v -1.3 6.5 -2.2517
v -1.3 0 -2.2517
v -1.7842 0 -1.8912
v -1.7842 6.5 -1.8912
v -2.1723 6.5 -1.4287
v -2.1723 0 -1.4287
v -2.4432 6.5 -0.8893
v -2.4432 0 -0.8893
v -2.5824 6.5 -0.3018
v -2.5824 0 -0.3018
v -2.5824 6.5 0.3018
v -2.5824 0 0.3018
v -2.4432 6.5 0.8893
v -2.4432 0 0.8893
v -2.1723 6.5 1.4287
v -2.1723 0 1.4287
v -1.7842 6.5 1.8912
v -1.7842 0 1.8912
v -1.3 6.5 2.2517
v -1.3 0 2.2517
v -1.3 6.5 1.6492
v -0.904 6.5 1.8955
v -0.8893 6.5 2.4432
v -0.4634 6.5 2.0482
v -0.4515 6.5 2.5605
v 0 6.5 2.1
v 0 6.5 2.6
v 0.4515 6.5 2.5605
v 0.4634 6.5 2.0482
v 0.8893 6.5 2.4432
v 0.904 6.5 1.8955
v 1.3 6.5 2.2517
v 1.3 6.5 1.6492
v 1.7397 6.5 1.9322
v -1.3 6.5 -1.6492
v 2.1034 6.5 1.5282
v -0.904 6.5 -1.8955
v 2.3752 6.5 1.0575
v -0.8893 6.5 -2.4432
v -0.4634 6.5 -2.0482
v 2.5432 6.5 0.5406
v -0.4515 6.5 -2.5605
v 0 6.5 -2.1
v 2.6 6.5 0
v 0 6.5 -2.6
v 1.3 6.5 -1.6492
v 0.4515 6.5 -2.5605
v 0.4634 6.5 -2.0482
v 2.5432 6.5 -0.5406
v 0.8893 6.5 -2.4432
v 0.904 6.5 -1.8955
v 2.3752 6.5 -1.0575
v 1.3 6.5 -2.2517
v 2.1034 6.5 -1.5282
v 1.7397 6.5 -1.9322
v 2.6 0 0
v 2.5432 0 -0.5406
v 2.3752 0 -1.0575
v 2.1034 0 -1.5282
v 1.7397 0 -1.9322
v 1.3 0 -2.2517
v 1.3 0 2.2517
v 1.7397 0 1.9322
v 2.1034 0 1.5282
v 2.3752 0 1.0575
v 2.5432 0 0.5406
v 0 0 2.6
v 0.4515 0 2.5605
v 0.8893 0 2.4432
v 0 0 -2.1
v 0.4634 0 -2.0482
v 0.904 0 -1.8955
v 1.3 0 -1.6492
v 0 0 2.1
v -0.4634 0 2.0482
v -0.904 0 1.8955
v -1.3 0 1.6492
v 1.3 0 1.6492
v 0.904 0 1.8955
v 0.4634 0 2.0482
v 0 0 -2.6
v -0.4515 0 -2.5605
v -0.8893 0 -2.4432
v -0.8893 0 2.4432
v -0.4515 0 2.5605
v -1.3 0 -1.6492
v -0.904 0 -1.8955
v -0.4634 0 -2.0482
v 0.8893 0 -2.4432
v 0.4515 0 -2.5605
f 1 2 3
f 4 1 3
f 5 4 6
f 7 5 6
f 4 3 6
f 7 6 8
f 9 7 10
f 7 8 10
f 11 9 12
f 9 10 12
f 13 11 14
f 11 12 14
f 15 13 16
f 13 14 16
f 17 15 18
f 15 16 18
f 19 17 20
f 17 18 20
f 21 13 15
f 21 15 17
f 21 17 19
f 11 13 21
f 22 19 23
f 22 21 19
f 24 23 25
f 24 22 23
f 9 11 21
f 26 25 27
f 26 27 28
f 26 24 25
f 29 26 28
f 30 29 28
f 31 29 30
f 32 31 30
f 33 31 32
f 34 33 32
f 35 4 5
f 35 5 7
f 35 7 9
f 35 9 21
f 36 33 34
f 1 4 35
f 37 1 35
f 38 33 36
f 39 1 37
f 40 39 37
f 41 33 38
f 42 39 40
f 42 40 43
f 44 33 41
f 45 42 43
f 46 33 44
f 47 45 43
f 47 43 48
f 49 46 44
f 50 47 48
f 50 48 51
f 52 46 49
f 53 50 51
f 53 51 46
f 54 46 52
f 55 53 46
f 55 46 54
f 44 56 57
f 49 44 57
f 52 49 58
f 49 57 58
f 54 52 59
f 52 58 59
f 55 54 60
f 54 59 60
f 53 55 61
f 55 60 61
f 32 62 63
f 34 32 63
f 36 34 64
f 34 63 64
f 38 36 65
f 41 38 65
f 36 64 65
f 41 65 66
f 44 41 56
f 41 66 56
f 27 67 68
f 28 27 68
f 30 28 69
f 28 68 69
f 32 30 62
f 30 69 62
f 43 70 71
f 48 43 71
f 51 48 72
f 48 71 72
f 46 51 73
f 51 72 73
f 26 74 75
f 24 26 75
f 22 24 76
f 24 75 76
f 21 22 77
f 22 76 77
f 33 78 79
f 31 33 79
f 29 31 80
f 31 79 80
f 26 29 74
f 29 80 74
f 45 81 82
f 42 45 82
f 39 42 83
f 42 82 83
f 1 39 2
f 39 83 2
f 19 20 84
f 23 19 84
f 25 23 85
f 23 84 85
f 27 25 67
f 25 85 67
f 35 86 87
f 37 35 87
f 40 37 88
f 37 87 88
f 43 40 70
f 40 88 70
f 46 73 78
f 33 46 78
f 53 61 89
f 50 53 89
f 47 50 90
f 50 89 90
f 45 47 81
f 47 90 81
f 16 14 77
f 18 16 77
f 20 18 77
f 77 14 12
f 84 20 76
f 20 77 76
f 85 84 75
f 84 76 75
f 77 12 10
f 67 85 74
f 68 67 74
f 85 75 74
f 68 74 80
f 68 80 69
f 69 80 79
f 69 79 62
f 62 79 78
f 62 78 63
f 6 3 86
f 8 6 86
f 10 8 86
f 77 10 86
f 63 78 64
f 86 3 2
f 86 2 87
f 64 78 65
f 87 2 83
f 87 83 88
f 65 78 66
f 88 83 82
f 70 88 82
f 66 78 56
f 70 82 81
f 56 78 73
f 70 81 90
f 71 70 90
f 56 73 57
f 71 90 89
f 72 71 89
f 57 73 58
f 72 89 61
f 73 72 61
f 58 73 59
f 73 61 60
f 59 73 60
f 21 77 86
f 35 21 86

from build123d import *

# Parameters (mm, degrees)
RESSALTO_EXTRUS_O2_DEPTH = 6.5


with BuildPart() as part:
    # Esboço1 → Ressalto-extrusão2 (new body)
    with BuildSketch(Plane(origin=(0, 0, 0), x_dir=(1, 0, 0), z_dir=(0, 1, 0))):
        with BuildLine():
            Line((-1.3, -1.64924225), (-1.3, 1.64924225))
            ThreePointArc((-1.3, 1.64924225), (-2.1, 0), (-1.3, -1.64924225))
        make_face()
        with BuildLine():
            Line((-1.3, 1.64924225), (-1.3, 2.25166605))
            ThreePointArc((-1.3, 2.25166605), (-2.6, 0), (-1.3, -2.25166605))
            Line((-1.3, -2.25166605), (-1.3, -1.64924225))
            ThreePointArc((-1.3, -1.64924225), (-2.1, 0), (-1.3, 1.64924225))
        make_face()
        with BuildLine():
            Line((0, 2.1), (0, 2.6))
            ThreePointArc((0, 2.6), (-0.672929517, 2.511407148), (-1.3, 2.25166605))
            Line((-1.3, 2.25166605), (-1.3, 1.64924225))
            ThreePointArc((-1.3, 1.64924225), (-0.687964852, 1.984112991), (0, 2.1))
        make_face()
        with BuildLine():
            Line((0, -2.6), (0, -2.1))
            ThreePointArc((0, -2.1), (-0.687964852, -1.984112991), (-1.3, -1.64924225))
            Line((-1.3, -1.64924225), (-1.3, -2.25166605))
            ThreePointArc((-1.3, -2.25166605), (-0.672929517, -2.511407148), (0, -2.6))
        make_face()
        with BuildLine():
            ThreePointArc((1.3, 2.25166605), (0.672929517, 2.511407148), (0, 2.6))
            Line((0, 2.6), (0, 2.1))
            ThreePointArc((0, 2.1), (0.687964852, 1.984112991), (1.3, 1.64924225))
            Line((1.3, 1.64924225), (1.3, 2.25166605))
        make_face()
        with BuildLine():
            ThreePointArc((1.3, -1.64924225), (0.687964852, -1.984112991), (0, -2.1))
            Line((0, -2.1), (0, -2.6))
            ThreePointArc((0, -2.6), (0.672929517, -2.511407148), (1.3, -2.25166605))
            Line((1.3, -2.25166605), (1.3, -1.64924225))
        make_face()
        with BuildLine():
            ThreePointArc((2.6, 0), (2.25166605, 1.3), (1.3, 2.25166605))
            Line((1.3, 2.25166605), (1.3, 1.64924225))
            ThreePointArc((1.3, 1.64924225), (1.889444363, 0.916515139), (2.1, 0))
            ThreePointArc((2.1, 0), (1.889444363, -0.916515139), (1.3, -1.64924225))
            Line((1.3, -1.64924225), (1.3, -2.25166605))
            ThreePointArc((1.3, -2.25166605), (2.25166605, -1.3), (2.6, 0))
        make_face()
        with BuildLine():
            ThreePointArc((2.1, 0), (1.889444363, 0.916515139), (1.3, 1.64924225))
            Line((1.3, 1.64924225), (1.3, -1.64924225))
            ThreePointArc((1.3, -1.64924225), (1.889444363, -0.916515139), (2.1, 0))
        make_face()
    extrude(amount=RESSALTO_EXTRUS_O2_DEPTH)


solid = part.part
